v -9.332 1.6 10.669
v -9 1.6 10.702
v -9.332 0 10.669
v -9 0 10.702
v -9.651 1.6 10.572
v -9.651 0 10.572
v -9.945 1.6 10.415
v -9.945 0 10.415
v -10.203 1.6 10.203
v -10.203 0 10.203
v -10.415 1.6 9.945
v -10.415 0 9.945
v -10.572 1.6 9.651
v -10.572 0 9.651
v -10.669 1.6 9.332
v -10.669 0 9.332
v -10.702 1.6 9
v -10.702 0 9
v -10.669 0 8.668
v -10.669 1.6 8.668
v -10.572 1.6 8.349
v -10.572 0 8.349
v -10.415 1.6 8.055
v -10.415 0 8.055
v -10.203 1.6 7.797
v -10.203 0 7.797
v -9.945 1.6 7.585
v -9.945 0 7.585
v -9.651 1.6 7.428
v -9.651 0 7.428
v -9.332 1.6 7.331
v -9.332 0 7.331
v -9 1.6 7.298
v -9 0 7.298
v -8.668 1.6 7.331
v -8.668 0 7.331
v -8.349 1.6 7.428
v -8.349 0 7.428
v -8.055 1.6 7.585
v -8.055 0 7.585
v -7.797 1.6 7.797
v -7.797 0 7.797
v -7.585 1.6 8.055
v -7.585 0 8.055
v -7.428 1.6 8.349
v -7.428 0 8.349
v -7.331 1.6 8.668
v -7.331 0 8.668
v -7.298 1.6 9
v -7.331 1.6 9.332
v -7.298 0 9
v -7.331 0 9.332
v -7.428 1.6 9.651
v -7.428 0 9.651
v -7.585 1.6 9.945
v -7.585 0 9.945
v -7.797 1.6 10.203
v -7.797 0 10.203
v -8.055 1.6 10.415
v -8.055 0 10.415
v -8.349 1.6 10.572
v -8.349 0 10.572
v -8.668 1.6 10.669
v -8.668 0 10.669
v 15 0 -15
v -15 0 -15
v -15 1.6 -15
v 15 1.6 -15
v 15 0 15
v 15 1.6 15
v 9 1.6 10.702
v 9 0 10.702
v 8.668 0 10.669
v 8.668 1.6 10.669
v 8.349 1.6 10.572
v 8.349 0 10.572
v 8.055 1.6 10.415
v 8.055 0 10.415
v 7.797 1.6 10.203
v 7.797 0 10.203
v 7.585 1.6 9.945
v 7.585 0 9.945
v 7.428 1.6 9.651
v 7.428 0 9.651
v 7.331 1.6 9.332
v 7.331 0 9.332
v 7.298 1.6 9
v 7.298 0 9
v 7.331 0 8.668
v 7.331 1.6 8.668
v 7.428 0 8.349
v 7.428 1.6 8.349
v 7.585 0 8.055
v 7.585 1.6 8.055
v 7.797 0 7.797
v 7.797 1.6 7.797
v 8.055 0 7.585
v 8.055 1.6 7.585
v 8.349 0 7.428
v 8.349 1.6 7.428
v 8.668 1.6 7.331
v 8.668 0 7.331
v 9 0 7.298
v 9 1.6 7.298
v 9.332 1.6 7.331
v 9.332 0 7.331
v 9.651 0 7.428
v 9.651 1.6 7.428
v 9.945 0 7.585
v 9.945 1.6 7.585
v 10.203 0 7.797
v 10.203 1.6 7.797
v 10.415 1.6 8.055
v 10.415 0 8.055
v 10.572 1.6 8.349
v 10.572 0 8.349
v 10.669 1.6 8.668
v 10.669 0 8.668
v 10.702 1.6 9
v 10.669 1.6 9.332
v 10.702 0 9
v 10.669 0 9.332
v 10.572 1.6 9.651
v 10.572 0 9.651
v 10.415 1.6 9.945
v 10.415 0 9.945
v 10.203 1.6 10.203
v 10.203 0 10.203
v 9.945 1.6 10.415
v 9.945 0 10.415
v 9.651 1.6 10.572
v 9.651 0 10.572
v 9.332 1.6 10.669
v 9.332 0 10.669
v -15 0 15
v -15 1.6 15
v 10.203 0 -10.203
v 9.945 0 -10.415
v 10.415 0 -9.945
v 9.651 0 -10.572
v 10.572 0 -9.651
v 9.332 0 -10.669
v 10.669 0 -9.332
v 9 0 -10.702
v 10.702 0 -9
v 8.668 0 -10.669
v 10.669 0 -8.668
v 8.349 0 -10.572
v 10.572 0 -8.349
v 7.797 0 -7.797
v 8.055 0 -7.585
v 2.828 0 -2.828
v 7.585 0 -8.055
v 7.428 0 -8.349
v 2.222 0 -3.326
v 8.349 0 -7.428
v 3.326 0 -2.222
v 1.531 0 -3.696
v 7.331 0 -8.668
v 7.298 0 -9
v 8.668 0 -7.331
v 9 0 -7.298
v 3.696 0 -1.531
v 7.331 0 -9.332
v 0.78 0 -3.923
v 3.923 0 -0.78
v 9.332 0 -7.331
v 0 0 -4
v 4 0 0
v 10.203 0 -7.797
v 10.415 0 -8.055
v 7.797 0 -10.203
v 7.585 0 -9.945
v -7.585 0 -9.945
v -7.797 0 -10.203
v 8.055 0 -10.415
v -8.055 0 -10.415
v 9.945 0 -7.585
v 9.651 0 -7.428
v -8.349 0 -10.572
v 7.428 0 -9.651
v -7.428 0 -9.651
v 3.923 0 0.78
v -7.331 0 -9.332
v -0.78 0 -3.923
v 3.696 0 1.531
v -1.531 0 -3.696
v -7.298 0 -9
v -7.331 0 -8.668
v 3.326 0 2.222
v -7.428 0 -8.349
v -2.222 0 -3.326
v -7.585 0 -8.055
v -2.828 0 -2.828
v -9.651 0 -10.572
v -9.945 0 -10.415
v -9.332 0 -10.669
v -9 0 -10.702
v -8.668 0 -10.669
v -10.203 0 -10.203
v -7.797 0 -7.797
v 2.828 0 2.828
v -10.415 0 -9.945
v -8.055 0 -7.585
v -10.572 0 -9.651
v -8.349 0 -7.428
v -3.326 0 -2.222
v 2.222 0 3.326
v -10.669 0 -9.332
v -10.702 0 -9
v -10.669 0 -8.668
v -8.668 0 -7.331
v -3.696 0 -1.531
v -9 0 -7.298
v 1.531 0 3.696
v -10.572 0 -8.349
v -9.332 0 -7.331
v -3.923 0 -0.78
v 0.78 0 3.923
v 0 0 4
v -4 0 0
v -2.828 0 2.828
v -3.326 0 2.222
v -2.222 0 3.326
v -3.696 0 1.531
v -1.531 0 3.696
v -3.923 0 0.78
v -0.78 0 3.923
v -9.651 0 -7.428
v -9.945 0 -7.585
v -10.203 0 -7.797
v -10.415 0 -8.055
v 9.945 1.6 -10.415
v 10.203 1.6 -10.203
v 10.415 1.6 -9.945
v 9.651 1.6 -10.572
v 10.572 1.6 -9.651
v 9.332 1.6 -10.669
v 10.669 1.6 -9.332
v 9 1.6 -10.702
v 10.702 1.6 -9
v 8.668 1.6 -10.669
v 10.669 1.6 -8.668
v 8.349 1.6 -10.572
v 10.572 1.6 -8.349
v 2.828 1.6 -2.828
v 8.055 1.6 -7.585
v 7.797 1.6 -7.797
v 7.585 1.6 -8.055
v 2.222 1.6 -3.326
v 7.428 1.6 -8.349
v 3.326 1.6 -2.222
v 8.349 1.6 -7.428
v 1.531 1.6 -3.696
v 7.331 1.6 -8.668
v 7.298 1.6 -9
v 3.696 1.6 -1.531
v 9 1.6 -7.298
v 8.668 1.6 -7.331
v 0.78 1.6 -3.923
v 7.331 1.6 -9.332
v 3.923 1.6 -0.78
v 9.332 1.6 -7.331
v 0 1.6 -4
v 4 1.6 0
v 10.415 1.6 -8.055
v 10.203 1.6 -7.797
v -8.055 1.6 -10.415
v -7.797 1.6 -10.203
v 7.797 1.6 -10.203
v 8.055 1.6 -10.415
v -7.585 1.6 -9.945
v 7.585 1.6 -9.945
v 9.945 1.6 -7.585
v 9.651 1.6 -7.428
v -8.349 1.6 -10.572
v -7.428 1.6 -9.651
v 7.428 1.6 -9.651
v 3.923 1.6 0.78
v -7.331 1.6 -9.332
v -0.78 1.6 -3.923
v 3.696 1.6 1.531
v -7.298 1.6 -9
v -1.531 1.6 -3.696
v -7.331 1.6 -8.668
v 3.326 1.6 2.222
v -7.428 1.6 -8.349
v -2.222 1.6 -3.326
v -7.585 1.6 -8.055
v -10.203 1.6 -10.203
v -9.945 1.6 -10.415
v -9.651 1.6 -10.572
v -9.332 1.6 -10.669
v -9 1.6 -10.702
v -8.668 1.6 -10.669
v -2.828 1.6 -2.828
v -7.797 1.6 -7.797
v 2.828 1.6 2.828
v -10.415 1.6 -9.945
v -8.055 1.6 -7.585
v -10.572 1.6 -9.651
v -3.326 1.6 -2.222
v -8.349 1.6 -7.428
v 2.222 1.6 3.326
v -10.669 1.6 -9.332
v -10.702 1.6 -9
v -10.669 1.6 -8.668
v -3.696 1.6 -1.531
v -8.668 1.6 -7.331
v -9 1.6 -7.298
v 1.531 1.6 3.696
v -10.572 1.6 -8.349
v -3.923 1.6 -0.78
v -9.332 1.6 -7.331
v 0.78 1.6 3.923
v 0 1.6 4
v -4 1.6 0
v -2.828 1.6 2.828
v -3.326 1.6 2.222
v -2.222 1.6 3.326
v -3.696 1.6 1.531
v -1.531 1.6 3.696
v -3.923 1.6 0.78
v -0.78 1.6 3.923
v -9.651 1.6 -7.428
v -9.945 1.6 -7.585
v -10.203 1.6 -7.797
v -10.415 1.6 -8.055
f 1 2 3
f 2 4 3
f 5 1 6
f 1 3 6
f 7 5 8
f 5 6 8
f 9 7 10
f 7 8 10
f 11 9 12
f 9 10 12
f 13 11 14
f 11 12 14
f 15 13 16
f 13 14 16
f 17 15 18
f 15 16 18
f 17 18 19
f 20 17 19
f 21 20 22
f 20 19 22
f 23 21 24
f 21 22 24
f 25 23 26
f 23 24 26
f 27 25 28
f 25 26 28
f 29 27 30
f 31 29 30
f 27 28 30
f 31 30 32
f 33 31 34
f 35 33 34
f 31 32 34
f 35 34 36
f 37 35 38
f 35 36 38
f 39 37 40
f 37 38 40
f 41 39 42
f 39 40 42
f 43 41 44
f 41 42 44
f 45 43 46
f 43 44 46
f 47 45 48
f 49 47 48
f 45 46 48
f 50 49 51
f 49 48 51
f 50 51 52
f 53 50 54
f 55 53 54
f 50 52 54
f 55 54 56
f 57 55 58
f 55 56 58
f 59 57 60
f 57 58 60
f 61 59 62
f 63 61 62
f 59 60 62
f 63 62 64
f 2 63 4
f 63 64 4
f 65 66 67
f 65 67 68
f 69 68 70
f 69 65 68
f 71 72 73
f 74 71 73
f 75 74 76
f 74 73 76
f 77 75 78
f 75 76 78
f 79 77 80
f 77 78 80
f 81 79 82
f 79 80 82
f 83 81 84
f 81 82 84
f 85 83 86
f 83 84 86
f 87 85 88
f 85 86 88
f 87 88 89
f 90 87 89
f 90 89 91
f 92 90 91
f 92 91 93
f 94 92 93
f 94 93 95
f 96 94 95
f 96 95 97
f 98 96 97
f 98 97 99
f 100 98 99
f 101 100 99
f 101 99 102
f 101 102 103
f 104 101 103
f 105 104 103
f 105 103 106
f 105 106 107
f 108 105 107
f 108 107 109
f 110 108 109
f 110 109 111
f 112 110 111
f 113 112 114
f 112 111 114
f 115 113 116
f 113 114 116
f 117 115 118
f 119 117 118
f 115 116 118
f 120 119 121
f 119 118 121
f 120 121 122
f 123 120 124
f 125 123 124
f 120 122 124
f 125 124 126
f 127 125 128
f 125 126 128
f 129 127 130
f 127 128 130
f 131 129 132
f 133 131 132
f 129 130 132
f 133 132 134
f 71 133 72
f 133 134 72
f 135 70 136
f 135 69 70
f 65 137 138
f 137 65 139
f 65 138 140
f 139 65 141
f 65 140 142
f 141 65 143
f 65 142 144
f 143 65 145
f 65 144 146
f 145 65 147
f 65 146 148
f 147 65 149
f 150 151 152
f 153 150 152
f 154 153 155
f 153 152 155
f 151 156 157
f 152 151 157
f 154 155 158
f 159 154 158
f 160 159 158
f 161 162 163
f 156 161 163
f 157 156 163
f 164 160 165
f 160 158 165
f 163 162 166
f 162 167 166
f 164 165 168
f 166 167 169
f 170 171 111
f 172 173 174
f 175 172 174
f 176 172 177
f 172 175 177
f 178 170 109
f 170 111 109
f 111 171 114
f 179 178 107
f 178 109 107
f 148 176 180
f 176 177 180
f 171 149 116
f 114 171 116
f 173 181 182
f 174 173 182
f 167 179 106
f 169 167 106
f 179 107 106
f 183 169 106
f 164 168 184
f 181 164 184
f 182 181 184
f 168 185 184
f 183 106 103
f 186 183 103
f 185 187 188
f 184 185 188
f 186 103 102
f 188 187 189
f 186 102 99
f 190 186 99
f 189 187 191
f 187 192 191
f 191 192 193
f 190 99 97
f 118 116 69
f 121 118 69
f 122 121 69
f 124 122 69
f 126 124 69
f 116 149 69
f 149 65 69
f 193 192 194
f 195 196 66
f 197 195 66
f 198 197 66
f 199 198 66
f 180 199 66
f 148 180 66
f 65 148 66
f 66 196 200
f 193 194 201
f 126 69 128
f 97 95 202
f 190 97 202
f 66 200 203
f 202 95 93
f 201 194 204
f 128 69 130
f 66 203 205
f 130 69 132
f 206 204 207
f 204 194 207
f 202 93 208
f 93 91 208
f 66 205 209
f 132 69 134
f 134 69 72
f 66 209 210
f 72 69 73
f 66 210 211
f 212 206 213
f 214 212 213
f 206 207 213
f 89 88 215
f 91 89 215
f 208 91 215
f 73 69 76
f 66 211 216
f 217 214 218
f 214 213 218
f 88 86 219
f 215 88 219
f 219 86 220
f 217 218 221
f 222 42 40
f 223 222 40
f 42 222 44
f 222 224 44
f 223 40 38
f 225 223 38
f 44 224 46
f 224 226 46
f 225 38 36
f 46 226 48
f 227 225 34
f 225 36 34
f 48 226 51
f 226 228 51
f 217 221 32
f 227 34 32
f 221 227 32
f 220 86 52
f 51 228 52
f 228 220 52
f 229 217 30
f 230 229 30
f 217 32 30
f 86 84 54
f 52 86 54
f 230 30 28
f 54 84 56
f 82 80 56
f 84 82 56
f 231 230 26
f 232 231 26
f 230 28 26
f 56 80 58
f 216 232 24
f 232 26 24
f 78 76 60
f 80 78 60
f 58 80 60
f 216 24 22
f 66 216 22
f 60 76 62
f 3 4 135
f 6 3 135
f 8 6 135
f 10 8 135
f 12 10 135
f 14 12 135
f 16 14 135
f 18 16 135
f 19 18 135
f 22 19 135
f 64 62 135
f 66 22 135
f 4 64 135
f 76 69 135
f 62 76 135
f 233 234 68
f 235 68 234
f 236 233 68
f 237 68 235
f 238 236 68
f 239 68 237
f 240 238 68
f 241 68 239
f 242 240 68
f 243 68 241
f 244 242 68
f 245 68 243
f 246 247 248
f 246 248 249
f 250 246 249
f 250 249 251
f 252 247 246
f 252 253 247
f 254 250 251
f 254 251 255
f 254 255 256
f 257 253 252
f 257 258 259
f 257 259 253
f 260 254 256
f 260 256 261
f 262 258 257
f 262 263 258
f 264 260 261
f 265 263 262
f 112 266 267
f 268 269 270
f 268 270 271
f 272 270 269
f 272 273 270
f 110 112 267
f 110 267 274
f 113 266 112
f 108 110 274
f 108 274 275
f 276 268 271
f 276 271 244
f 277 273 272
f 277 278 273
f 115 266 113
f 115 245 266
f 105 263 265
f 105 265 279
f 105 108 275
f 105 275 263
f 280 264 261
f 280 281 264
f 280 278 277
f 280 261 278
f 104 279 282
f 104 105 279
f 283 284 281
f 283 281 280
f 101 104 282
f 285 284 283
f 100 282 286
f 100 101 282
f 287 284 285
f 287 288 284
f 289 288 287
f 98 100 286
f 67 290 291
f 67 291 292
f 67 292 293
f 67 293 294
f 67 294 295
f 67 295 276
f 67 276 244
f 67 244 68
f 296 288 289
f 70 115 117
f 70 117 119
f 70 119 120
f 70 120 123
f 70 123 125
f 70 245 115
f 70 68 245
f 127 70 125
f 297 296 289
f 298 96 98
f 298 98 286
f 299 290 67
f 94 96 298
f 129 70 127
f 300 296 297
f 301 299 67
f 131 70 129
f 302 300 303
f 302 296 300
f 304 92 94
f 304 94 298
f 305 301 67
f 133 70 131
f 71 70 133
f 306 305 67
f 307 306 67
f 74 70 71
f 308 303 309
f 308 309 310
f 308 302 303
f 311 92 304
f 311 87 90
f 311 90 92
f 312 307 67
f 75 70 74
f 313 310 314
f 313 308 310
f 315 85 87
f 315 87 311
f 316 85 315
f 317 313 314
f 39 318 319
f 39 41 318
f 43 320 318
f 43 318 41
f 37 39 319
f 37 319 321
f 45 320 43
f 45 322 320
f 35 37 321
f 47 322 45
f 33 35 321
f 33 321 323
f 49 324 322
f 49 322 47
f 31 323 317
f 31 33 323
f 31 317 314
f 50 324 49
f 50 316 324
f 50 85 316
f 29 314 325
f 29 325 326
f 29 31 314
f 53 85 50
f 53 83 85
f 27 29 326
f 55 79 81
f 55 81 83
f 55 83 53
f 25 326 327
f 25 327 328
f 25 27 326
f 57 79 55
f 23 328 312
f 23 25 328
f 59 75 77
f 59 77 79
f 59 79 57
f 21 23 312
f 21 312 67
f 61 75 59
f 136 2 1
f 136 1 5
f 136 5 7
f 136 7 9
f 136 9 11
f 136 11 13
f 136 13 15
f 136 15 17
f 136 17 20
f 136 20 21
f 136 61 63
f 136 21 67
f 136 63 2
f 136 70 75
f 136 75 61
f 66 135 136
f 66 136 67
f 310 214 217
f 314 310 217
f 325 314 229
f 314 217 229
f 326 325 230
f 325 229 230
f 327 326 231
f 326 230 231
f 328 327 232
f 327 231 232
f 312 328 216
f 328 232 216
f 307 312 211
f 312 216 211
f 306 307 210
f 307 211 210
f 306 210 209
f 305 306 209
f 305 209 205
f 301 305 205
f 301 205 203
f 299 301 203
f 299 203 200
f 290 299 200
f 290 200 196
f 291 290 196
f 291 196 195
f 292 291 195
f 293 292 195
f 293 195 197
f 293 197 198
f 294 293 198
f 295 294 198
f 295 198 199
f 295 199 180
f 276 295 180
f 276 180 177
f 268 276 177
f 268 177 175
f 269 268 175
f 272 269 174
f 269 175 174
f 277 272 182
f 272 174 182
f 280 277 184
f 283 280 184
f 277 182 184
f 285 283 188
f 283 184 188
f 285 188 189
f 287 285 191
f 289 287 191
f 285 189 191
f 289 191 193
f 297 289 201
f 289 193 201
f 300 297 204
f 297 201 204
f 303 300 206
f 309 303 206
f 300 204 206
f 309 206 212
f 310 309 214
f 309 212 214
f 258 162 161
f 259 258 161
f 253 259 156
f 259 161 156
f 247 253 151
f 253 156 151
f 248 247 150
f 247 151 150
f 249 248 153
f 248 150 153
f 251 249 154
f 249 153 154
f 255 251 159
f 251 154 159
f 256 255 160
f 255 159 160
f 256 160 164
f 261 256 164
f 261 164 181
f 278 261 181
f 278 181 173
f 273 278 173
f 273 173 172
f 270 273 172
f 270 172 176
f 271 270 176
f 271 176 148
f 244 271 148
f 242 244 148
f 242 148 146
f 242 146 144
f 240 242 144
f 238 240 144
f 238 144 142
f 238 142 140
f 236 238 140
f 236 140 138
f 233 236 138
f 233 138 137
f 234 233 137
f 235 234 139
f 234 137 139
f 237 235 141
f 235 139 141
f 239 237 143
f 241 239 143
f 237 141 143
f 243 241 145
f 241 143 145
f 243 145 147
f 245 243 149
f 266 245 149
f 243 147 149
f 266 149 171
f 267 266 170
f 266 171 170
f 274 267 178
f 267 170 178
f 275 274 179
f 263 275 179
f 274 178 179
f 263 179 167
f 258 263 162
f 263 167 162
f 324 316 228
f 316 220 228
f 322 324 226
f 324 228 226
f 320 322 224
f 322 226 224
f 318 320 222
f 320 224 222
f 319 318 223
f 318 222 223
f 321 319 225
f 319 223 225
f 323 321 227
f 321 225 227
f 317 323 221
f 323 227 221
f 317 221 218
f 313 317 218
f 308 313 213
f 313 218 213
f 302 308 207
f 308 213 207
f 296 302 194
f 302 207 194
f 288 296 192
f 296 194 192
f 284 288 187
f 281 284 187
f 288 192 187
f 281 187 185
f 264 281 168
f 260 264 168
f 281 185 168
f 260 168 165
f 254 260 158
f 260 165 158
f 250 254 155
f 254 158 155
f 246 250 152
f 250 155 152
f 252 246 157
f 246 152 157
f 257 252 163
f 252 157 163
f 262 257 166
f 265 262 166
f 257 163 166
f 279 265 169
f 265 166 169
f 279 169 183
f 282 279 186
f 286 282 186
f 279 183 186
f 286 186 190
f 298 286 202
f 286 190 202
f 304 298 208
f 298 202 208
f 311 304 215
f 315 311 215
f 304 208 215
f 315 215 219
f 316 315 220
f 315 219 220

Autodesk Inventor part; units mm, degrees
ref_plane "YZ Plane" through (0, 0, 0) normal (1, 0, 0) x (0, 1, 0)
ref_plane "XZ Plane" through (0, 0, 0) normal (0, 1, 0) x (-1, 0, 0)
ref_plane "XY Plane" through (0, 0, 0) normal (0, 0, 1) x (1, 0, 0)
sketch "スケッチ1" plane through (0, 0, 0) normal (0, 1, 0) x (-1, 0, 0)
  line L0 (15, -15) -> (-15, -15)
  line L1 (-15, -15) -> (-15, 15)
  line L2 (-15, 15) -> (15, 15)
  line L3 (15, 15) -> (15, -15)
  line L4 (15, -15) -> (-15, 15) construction
  line L5 (-15, -15) -> (15, 15) construction
  point P0 (0, 0)
  point P1 (0, 0)
  dimension "d0" = 30
  dimension "d1" = 30
extrude "押し出し1" add sketch "スケッチ1" along normal blind 1.6
sketch "スケッチ3" plane through (0, 1.6, 0) normal (0, 1, 0) x (1, 0, 0)
  point P0 (0, 0)
  point P1 (0, 0)
  dimension "d17" = 0
hole "穴2" at (0, 1.6, 0) direction (0, -1, 0) diameter 8 depth 4.8
sketch "スケッチ4" plane through (0, 1.6, 0) normal (0, 1, 0) x (1, 0, 0)
  line L0 (15, 15) -> (-15, 15) projected
  line L1 (15, -15) -> (15, 15) projected
  point P0 (0, 0)
  point P1 (-9, -9)
  point P2 (9, -9)
  point P3 (9, 9)
  point P4 (-9, 9)
  dimension "d27" = 360
  dimension "d36" = 6
  dimension "d37" = 6
hole "穴3" at (-9, 1.6, 9) at (9, 1.6, 9) at (9, 1.6, -9) at (-9, 1.6, -9) direction (0, -1, 0) diameter 3.4036 depth 1.6 clearance for "Countersunk Flat Head Screw ISO 2009/7046" size "M3" standard "ISO"
properties part number "pcb" material "フェノール樹脂"
